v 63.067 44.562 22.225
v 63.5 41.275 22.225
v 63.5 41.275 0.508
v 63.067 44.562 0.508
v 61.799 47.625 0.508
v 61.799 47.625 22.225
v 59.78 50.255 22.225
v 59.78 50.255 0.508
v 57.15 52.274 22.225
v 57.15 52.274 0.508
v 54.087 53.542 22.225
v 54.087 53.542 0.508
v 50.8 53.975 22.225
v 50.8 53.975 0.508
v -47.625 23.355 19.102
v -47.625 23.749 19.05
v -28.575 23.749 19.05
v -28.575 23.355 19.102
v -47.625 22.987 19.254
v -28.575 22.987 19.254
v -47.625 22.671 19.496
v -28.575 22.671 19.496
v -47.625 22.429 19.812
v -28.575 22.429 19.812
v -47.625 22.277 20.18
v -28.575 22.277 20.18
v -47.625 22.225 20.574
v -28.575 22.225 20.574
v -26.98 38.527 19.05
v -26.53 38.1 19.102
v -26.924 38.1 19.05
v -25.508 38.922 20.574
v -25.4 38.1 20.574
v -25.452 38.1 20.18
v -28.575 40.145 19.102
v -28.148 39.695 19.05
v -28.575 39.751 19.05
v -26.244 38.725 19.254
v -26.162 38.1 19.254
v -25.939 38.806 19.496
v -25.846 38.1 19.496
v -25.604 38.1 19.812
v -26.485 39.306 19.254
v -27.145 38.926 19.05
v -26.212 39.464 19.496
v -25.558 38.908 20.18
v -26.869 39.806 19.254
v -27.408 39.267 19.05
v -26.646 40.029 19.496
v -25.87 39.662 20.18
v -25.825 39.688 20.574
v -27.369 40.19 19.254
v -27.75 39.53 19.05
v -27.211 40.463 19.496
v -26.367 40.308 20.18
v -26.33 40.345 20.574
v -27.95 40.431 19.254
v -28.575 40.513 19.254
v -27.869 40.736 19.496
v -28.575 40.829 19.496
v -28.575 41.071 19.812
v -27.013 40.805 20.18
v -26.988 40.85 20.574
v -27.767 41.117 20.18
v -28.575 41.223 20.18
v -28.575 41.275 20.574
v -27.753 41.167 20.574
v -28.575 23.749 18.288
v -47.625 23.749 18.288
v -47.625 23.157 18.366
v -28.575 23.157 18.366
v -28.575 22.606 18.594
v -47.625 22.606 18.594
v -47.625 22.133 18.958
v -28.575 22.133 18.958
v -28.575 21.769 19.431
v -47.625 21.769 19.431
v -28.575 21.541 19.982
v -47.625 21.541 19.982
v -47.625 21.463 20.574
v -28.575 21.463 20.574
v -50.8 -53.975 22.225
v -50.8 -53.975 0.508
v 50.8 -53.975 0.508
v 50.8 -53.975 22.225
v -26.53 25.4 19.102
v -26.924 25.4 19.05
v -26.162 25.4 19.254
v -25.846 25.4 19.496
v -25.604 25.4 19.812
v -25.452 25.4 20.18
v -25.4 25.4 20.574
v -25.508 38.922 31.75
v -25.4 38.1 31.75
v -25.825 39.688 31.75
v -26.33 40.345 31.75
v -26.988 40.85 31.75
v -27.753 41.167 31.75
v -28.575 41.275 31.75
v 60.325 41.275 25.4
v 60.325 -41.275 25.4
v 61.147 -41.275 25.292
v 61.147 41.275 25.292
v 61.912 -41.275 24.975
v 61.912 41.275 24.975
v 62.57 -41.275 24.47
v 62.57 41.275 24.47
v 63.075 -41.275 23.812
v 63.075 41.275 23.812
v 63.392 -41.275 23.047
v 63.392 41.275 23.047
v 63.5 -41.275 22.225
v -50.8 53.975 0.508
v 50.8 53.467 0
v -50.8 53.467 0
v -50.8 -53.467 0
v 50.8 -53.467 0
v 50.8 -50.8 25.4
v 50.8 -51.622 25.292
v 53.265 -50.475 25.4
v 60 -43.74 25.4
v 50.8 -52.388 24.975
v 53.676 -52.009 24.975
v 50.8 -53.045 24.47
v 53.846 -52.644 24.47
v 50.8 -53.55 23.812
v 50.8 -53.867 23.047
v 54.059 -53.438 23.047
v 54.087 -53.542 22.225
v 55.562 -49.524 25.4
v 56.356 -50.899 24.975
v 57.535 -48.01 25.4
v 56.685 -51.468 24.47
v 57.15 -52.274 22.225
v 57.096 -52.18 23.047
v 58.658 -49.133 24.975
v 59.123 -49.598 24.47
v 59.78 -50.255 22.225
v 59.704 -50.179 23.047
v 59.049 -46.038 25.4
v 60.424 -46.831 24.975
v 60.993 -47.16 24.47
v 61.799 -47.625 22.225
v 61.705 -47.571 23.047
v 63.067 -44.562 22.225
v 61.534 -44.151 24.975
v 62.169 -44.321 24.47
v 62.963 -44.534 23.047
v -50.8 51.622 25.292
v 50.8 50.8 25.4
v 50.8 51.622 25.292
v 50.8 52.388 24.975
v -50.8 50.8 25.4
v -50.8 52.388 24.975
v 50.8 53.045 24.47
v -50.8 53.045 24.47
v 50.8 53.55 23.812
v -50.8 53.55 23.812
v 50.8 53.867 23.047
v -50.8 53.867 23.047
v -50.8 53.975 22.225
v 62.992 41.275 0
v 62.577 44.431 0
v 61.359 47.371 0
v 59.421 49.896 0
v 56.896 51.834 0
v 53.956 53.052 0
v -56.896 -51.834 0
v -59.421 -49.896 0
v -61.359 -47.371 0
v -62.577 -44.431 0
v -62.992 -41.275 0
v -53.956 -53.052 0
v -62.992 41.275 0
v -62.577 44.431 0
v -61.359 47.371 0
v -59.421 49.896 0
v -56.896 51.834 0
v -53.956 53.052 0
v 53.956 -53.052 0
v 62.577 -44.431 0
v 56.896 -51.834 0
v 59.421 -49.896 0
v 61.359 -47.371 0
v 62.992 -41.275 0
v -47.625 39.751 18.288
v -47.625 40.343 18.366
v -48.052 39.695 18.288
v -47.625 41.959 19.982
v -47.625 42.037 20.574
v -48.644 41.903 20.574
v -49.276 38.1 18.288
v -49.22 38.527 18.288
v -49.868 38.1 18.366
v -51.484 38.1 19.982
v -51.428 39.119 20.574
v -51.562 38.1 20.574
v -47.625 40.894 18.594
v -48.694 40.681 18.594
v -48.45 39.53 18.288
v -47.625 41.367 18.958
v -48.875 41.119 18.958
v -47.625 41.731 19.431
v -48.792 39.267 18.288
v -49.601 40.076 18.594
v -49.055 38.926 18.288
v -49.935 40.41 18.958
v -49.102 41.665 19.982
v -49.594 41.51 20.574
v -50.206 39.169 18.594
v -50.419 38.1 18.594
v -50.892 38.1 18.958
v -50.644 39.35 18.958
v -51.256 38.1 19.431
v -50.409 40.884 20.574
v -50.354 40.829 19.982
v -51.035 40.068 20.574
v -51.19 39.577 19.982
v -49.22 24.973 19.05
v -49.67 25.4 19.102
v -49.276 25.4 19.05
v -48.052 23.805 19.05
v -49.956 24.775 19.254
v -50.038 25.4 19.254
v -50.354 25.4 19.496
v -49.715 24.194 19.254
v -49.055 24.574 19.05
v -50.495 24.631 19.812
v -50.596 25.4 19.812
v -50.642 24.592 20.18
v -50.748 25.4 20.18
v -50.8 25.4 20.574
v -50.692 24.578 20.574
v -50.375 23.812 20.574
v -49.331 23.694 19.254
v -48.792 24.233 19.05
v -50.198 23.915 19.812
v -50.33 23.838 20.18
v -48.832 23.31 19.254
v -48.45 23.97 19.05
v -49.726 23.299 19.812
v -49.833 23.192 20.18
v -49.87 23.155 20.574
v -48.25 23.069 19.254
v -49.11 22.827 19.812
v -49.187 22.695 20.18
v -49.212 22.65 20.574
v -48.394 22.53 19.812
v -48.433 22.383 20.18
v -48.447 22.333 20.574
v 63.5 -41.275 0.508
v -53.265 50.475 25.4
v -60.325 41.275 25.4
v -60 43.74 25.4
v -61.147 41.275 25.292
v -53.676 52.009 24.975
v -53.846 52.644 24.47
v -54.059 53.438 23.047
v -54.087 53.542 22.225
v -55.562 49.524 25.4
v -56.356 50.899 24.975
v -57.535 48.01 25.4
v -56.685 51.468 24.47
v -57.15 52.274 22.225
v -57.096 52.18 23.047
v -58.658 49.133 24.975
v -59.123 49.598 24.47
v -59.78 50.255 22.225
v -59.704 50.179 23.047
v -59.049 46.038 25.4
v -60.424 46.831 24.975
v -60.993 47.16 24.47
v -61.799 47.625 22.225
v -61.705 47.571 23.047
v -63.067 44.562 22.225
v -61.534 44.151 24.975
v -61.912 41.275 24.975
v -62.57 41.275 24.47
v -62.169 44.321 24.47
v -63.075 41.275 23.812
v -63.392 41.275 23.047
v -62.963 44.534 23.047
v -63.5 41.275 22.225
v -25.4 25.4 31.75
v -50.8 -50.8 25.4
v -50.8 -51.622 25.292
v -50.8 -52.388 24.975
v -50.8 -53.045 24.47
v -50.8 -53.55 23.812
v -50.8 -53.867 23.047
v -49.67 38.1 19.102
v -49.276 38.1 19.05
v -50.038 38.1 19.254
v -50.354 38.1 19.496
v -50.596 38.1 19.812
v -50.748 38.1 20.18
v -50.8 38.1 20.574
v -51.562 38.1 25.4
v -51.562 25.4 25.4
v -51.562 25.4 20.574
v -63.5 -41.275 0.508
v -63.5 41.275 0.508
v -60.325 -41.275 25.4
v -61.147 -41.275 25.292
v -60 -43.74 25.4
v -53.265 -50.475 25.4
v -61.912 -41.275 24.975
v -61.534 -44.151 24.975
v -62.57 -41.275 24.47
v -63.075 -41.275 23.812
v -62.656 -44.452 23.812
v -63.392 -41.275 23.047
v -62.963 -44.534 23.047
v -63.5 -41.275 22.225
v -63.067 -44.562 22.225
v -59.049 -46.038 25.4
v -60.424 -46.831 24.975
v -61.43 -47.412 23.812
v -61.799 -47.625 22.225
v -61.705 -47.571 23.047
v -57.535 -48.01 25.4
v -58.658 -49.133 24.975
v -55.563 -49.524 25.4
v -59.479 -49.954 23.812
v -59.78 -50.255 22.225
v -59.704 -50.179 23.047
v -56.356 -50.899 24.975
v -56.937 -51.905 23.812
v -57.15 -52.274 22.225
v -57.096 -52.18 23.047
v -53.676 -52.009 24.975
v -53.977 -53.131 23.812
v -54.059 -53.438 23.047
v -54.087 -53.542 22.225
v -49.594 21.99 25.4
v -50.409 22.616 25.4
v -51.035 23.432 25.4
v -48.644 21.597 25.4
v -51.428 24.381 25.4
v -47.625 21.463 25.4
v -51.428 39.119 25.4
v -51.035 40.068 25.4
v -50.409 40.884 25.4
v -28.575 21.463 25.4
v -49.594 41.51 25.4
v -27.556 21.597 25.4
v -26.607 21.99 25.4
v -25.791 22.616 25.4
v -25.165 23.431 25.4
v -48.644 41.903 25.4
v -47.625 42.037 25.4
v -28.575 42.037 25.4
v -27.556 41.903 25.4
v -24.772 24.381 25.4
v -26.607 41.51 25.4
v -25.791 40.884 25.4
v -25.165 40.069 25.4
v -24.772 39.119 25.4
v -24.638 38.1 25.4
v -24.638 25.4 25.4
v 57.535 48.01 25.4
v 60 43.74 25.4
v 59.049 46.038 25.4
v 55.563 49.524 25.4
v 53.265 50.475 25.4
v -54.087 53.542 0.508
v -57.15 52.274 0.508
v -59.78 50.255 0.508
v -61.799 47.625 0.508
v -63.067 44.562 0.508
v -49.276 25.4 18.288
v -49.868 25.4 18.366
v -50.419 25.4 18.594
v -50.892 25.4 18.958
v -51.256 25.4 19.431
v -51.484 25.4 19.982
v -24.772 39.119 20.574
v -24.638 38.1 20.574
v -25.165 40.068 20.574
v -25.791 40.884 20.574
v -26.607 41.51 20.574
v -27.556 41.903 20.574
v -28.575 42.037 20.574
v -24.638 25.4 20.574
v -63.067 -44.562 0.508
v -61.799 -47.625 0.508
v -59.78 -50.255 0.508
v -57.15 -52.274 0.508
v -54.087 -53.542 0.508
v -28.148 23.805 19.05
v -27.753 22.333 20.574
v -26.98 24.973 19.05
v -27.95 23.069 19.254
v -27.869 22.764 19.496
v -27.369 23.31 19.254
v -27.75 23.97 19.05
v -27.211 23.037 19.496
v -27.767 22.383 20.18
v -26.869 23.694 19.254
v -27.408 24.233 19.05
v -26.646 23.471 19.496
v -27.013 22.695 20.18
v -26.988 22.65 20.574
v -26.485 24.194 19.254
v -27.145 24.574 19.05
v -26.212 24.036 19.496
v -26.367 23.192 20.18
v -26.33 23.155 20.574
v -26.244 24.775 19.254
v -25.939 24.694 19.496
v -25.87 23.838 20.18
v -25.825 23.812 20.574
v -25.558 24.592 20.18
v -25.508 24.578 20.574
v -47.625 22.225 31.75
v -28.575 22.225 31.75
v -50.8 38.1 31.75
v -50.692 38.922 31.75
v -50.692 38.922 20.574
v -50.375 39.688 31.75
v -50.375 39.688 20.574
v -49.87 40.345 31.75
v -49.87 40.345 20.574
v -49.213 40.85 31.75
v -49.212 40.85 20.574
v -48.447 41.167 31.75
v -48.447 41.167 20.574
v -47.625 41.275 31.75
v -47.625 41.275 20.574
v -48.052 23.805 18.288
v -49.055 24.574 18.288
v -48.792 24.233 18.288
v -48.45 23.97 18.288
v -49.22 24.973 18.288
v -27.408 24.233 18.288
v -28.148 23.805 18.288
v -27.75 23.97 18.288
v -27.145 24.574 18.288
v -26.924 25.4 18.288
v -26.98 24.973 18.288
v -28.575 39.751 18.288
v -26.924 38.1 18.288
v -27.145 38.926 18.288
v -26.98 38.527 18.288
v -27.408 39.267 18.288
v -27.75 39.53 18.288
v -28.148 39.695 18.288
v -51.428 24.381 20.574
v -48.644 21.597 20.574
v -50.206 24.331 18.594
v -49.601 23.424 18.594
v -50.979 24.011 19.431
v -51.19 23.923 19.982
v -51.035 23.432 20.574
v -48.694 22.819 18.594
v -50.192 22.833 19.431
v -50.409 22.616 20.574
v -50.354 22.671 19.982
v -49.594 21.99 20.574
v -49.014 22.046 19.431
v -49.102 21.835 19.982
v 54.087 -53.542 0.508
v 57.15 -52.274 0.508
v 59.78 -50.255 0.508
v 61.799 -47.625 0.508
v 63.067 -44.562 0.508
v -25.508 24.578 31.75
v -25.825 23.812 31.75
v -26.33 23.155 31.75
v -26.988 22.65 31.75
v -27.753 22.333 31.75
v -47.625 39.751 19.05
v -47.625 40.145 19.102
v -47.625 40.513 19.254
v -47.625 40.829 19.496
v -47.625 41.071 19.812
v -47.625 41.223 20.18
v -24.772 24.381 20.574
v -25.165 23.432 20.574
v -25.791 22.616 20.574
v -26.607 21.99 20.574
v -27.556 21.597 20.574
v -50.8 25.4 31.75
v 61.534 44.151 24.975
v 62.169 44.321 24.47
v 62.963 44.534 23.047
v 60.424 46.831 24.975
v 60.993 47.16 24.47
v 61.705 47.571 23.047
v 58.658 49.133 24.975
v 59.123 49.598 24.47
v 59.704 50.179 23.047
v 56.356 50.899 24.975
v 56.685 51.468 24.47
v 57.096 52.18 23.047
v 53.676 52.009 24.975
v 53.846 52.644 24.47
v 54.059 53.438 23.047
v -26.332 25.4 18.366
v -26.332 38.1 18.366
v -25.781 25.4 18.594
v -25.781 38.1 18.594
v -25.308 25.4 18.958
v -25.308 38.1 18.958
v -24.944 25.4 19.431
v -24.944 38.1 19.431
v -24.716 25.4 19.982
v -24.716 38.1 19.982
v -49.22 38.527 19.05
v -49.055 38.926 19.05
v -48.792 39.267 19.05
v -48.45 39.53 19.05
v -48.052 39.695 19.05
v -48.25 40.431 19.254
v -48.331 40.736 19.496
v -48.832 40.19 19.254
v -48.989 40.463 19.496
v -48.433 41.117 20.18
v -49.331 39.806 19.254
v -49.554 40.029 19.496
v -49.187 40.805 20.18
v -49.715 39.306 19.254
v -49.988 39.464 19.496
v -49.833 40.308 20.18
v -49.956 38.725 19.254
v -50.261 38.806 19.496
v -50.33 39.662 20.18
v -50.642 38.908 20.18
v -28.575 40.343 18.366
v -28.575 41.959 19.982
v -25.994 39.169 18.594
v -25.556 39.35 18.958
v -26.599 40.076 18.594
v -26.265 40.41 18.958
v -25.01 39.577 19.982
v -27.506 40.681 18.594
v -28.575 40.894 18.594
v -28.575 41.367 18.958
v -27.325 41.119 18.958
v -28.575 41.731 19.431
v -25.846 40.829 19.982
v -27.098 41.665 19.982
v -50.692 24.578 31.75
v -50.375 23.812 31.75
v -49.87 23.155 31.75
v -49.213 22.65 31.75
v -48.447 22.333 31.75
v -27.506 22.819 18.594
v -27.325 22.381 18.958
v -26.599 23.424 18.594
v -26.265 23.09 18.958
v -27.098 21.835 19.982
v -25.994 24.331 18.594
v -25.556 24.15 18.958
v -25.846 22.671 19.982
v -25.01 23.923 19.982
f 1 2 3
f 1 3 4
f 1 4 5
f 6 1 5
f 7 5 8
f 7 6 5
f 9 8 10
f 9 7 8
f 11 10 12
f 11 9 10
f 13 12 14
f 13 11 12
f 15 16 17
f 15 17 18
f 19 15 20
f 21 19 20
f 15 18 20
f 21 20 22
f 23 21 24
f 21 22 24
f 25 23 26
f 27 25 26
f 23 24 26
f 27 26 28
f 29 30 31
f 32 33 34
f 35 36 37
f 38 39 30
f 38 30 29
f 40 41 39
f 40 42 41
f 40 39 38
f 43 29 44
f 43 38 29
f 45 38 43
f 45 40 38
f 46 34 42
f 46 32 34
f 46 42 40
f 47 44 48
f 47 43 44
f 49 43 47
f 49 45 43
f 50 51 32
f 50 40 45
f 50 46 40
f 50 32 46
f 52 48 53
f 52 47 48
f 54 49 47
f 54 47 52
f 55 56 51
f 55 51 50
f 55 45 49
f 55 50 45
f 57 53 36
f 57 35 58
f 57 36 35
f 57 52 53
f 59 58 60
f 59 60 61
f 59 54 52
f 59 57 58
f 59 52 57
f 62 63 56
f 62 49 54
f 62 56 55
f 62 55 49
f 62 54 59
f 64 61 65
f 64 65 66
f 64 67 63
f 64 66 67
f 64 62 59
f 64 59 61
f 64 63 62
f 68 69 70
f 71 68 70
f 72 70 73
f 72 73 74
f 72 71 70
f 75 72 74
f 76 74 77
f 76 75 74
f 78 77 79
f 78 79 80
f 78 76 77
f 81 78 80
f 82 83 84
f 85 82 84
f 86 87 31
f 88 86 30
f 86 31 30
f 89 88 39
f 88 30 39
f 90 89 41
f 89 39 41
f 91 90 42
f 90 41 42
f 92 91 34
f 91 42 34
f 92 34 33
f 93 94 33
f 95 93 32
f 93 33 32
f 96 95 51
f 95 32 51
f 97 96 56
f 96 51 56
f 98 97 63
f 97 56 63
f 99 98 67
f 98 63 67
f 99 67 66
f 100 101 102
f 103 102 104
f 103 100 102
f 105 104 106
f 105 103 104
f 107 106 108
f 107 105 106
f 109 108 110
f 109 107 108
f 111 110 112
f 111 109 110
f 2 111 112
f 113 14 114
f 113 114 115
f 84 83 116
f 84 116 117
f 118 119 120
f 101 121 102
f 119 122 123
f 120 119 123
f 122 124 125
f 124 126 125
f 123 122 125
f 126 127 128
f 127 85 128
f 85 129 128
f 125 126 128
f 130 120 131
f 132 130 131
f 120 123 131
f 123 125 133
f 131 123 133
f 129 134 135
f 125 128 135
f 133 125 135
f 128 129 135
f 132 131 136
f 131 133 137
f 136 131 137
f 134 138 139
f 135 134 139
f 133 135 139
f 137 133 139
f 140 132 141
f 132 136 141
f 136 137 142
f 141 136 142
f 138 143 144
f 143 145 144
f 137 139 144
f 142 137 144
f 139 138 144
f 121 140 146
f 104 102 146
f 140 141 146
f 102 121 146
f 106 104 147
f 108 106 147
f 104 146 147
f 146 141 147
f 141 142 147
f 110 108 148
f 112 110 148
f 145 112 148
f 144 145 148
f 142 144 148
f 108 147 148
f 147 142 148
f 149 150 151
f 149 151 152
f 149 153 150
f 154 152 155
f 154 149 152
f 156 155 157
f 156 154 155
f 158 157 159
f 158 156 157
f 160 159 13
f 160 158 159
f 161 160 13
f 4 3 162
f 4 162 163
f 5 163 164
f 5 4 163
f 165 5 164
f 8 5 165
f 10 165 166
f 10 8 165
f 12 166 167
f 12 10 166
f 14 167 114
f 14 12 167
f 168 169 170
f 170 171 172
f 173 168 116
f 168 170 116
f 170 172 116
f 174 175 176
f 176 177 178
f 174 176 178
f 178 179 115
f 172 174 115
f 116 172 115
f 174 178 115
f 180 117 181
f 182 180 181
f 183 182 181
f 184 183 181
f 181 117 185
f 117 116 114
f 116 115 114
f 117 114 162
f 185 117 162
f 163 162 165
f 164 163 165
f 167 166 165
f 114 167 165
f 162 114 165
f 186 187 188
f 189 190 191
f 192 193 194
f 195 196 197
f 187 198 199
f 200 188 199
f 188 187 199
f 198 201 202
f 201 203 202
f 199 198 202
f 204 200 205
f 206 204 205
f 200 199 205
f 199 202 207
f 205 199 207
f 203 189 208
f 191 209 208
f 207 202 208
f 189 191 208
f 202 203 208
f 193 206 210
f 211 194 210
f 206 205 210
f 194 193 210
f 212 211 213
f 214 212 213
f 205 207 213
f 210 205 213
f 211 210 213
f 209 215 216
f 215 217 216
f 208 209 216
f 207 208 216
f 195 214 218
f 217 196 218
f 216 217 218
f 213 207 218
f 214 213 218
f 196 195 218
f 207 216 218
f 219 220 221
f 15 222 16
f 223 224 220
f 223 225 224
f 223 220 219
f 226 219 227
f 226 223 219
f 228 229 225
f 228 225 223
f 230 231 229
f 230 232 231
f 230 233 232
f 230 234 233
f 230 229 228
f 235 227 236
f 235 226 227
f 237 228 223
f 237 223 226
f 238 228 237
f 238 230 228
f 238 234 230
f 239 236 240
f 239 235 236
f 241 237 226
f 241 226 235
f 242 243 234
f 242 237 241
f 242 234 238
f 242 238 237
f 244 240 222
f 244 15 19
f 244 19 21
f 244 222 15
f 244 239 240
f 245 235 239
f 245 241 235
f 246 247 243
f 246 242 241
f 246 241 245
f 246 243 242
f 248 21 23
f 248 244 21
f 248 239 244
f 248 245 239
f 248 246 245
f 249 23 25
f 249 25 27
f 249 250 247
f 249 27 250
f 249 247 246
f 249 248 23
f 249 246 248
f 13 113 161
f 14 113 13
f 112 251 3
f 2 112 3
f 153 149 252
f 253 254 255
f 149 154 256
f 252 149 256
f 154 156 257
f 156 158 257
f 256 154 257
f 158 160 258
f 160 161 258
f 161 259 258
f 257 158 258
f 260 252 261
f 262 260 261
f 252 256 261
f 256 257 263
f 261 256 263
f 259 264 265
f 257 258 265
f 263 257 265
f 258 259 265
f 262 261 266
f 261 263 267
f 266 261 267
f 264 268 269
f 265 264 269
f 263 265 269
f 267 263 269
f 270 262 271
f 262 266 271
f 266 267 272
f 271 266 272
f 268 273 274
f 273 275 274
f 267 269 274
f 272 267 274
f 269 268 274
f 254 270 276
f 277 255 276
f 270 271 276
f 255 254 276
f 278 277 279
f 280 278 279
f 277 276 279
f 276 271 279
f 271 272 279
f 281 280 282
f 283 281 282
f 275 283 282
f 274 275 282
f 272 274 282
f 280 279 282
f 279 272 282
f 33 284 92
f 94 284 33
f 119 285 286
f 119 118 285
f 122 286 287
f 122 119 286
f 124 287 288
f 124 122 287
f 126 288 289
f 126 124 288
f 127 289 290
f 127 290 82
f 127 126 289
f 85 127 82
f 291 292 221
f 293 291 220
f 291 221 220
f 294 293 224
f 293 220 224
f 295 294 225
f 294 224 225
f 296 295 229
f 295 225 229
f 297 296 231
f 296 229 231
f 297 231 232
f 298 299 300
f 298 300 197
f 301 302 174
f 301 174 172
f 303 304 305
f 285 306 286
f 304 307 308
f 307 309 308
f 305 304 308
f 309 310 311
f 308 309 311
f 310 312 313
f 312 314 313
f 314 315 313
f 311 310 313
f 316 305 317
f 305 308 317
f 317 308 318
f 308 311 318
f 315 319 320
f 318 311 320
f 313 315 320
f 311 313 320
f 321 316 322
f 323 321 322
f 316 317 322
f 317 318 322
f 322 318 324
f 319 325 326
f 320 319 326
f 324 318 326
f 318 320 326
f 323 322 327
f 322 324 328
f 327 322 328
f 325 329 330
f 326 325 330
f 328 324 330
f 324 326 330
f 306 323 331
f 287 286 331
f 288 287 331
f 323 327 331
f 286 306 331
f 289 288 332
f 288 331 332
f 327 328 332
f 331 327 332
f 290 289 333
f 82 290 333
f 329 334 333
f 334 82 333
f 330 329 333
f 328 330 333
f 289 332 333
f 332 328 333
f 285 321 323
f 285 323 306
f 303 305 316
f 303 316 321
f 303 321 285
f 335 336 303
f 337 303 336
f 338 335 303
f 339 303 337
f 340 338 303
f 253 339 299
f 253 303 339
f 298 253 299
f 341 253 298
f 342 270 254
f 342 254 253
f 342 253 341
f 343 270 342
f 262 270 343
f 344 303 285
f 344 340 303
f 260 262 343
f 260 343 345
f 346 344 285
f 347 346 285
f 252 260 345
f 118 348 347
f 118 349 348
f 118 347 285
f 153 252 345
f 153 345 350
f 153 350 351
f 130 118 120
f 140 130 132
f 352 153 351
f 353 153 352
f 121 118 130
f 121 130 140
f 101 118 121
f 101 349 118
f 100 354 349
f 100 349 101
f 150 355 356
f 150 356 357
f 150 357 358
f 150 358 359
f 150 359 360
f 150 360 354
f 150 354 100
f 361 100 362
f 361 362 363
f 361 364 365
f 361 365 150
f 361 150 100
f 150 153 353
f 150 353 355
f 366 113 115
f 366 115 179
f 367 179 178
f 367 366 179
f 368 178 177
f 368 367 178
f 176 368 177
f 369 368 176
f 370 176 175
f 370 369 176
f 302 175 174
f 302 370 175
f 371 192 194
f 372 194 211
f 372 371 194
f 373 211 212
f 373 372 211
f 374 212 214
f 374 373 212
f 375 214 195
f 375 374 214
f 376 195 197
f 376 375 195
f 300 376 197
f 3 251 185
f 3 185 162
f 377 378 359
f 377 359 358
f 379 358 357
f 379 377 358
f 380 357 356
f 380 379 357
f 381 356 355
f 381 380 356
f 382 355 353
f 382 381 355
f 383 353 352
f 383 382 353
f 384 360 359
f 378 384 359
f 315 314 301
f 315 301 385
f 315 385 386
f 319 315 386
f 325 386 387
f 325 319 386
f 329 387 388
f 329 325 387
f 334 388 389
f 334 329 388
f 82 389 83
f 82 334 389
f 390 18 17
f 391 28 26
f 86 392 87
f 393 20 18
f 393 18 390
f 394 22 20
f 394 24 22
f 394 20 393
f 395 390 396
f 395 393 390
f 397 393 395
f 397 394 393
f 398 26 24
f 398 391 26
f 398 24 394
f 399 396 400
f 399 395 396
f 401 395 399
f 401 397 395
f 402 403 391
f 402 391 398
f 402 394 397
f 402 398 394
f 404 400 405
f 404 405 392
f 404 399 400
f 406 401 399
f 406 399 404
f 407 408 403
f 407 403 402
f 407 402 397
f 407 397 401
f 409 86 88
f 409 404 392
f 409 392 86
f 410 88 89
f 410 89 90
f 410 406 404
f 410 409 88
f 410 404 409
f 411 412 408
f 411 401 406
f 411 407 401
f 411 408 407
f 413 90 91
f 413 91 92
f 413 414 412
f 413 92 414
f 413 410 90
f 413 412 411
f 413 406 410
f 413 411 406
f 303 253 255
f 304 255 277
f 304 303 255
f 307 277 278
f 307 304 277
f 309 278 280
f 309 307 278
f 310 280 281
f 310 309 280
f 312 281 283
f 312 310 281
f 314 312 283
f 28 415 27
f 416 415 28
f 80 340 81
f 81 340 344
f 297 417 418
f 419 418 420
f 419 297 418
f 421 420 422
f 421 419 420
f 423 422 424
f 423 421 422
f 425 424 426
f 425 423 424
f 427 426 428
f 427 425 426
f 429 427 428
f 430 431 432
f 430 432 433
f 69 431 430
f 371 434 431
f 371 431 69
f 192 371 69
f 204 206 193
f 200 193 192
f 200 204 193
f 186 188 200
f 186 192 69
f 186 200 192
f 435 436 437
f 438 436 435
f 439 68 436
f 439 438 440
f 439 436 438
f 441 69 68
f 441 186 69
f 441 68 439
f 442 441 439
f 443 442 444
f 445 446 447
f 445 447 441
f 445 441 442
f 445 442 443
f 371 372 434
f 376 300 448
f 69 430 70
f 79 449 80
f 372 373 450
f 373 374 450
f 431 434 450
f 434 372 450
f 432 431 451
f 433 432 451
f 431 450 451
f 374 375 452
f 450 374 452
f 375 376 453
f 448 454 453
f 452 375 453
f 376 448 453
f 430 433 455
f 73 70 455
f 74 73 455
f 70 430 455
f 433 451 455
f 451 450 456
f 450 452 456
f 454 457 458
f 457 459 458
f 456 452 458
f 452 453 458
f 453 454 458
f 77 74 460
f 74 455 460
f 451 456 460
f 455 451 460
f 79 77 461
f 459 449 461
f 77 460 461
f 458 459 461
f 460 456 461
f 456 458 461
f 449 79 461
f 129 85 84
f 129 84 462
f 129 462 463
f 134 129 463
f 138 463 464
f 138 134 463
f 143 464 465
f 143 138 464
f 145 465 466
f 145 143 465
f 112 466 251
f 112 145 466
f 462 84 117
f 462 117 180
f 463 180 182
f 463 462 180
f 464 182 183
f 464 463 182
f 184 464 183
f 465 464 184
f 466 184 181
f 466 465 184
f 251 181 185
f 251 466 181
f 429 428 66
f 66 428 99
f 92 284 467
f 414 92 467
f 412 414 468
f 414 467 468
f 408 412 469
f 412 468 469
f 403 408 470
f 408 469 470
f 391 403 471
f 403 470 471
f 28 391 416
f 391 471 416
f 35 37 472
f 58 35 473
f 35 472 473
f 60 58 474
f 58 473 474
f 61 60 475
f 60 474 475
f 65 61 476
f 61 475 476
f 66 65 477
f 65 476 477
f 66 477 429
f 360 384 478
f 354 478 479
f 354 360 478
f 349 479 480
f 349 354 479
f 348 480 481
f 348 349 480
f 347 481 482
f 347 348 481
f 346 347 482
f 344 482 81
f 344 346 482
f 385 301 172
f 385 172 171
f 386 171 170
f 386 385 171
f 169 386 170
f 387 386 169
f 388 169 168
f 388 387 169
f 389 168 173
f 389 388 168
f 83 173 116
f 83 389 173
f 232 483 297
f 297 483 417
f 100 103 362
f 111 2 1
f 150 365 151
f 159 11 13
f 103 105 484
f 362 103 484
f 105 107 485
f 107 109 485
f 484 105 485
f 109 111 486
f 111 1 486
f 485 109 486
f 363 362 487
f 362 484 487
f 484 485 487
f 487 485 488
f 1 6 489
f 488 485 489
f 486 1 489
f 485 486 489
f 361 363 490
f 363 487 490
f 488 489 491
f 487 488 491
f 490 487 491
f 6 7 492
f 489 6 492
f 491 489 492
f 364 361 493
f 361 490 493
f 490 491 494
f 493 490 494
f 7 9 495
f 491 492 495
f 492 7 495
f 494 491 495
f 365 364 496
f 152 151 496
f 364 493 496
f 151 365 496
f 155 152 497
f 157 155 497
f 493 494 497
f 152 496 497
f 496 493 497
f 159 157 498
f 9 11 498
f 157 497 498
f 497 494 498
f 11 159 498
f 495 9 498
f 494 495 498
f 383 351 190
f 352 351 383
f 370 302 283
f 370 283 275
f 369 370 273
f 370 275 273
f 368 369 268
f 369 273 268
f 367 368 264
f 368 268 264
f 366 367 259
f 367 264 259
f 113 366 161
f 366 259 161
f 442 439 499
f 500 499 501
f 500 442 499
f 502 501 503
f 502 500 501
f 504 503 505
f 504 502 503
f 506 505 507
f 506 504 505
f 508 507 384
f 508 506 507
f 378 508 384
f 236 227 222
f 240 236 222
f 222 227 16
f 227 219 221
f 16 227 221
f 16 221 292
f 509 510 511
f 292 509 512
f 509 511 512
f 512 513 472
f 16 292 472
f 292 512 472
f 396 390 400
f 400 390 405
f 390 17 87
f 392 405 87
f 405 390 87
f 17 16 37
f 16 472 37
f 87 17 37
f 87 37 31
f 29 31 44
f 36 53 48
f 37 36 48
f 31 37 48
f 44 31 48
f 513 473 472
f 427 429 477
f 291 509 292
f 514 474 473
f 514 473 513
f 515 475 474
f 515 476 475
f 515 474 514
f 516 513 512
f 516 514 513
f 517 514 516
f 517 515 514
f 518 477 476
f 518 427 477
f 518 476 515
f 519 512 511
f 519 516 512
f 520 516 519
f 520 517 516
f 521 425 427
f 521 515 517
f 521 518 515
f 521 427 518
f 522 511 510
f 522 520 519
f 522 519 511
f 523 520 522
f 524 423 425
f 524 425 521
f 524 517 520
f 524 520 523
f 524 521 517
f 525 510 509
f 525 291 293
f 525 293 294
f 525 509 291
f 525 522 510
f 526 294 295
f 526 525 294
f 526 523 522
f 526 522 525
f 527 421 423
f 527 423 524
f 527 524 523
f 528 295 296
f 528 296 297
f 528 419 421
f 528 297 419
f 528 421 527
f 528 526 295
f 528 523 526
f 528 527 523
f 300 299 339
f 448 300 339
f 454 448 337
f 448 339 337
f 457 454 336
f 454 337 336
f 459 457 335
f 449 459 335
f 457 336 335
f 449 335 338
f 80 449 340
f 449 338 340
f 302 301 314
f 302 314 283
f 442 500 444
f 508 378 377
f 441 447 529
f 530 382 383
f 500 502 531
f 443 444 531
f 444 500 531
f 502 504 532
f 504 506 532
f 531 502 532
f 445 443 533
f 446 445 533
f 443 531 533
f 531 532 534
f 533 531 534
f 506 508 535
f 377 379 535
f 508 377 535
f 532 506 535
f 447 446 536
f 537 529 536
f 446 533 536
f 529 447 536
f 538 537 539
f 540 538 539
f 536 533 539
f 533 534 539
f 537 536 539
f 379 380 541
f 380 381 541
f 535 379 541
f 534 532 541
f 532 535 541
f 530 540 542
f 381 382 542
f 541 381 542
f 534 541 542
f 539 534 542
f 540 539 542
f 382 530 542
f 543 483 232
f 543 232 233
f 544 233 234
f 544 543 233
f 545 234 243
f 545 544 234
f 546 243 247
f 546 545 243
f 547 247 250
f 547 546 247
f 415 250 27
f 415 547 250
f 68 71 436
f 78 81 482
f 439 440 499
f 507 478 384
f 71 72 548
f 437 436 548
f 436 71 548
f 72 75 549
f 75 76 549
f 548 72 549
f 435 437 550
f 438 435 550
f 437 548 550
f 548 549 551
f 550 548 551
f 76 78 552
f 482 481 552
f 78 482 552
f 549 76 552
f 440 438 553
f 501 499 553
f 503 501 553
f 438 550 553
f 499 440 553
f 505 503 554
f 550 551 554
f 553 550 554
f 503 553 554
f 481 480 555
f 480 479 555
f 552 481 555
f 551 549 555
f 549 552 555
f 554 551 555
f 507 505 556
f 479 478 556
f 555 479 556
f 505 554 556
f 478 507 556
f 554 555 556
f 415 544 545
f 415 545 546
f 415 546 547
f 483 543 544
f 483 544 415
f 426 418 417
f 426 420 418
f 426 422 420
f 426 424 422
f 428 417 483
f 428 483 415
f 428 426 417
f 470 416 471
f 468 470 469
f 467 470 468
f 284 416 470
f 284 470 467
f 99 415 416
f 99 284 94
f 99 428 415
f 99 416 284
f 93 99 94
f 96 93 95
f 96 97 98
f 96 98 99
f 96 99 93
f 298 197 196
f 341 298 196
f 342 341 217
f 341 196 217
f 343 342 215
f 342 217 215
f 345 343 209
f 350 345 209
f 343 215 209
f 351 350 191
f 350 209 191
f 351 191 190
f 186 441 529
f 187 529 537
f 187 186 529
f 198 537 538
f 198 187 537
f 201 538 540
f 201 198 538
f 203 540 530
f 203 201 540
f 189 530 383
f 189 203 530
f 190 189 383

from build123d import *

# Parameters (mm, degrees)
F0_W       = 127
F0_H       = 107.95
F1_DEPTH   = 25.4
F2_W       = 25.4
F2_H       = 19.05
F3_DEPTH   = 6.35
F4_R       = 3.175
F5_R       = 1.524
F6_R       = 12.7
F7_R       = 3.175
F8_SIZE    = 0.508
F9_OFFSET  = 0.508
F10_OFFSET = 0.762


with BuildPart() as f1:
    # F0 (on Top) → F1 (new body)
    with BuildSketch(Plane.XY):
        Rectangle(F0_W, F0_H)
    extrude(amount=F1_DEPTH)

    # F6
    f6_edges = [f1.edges().sort_by_distance(p)[0] for p in [
        (63.5, -53.975, 12.7),
        (63.5, 53.975, 12.7),
        (-63.5, 53.975, 12.7),
        (-63.5, -53.975, 12.7),
    ]]
    fillet(f6_edges, radius=F6_R)

    # F7
    f7_edges = [f1.edges().sort_by_distance(p)[0] for p in [
        (0, -53.975, 25.4),
    ]]
    fillet(f7_edges, radius=F7_R)

    # F8
    f8_edges = [f1.edges().sort_by_distance(p)[0] for p in [
        (0, -53.975, 0),
    ]]
    chamfer(f8_edges, length=F8_SIZE)


with BuildPart() as f3:
    # F2 (on face) → F3 (new body, symmetric)
    with BuildSketch(Plane.XY.offset(25.4)):
        with Locations((-38.1, 31.75)):
            Rectangle(F2_W, F2_H)
    extrude(amount=F3_DEPTH, both=True)

    # F4
    f4_edges = [f3.edges().sort_by_distance(p)[0] for p in [
        (-25.4, 41.275, 25.4),
        (-25.4, 22.225, 25.4),
        (-50.8, 22.225, 25.4),
        (-50.8, 41.275, 25.4),
    ]]
    fillet(f4_edges, radius=F4_R)

    # F5
    f5_edges = [f3.edges().sort_by_distance(p)[0] for p in [
        (-38.1, 22.225, 19.05),
    ]]
    fillet(f5_edges, radius=F5_R)


with BuildPart() as f1_1:
    add(f1.part)

    # F9: cut F3, made larger all round first
    f9_tool = offset(f3.part, amount=F9_OFFSET, kind=Kind.INTERSECTION, mode=Mode.PRIVATE)
    add(f9_tool, mode=Mode.SUBTRACT)

    # F10: cut F3, made larger all round first
    f10_tool = offset(f3.part, amount=F10_OFFSET, kind=Kind.INTERSECTION, mode=Mode.PRIVATE)
    add(f10_tool, mode=Mode.SUBTRACT)


solid = Compound([f3.part, f1_1.part])
